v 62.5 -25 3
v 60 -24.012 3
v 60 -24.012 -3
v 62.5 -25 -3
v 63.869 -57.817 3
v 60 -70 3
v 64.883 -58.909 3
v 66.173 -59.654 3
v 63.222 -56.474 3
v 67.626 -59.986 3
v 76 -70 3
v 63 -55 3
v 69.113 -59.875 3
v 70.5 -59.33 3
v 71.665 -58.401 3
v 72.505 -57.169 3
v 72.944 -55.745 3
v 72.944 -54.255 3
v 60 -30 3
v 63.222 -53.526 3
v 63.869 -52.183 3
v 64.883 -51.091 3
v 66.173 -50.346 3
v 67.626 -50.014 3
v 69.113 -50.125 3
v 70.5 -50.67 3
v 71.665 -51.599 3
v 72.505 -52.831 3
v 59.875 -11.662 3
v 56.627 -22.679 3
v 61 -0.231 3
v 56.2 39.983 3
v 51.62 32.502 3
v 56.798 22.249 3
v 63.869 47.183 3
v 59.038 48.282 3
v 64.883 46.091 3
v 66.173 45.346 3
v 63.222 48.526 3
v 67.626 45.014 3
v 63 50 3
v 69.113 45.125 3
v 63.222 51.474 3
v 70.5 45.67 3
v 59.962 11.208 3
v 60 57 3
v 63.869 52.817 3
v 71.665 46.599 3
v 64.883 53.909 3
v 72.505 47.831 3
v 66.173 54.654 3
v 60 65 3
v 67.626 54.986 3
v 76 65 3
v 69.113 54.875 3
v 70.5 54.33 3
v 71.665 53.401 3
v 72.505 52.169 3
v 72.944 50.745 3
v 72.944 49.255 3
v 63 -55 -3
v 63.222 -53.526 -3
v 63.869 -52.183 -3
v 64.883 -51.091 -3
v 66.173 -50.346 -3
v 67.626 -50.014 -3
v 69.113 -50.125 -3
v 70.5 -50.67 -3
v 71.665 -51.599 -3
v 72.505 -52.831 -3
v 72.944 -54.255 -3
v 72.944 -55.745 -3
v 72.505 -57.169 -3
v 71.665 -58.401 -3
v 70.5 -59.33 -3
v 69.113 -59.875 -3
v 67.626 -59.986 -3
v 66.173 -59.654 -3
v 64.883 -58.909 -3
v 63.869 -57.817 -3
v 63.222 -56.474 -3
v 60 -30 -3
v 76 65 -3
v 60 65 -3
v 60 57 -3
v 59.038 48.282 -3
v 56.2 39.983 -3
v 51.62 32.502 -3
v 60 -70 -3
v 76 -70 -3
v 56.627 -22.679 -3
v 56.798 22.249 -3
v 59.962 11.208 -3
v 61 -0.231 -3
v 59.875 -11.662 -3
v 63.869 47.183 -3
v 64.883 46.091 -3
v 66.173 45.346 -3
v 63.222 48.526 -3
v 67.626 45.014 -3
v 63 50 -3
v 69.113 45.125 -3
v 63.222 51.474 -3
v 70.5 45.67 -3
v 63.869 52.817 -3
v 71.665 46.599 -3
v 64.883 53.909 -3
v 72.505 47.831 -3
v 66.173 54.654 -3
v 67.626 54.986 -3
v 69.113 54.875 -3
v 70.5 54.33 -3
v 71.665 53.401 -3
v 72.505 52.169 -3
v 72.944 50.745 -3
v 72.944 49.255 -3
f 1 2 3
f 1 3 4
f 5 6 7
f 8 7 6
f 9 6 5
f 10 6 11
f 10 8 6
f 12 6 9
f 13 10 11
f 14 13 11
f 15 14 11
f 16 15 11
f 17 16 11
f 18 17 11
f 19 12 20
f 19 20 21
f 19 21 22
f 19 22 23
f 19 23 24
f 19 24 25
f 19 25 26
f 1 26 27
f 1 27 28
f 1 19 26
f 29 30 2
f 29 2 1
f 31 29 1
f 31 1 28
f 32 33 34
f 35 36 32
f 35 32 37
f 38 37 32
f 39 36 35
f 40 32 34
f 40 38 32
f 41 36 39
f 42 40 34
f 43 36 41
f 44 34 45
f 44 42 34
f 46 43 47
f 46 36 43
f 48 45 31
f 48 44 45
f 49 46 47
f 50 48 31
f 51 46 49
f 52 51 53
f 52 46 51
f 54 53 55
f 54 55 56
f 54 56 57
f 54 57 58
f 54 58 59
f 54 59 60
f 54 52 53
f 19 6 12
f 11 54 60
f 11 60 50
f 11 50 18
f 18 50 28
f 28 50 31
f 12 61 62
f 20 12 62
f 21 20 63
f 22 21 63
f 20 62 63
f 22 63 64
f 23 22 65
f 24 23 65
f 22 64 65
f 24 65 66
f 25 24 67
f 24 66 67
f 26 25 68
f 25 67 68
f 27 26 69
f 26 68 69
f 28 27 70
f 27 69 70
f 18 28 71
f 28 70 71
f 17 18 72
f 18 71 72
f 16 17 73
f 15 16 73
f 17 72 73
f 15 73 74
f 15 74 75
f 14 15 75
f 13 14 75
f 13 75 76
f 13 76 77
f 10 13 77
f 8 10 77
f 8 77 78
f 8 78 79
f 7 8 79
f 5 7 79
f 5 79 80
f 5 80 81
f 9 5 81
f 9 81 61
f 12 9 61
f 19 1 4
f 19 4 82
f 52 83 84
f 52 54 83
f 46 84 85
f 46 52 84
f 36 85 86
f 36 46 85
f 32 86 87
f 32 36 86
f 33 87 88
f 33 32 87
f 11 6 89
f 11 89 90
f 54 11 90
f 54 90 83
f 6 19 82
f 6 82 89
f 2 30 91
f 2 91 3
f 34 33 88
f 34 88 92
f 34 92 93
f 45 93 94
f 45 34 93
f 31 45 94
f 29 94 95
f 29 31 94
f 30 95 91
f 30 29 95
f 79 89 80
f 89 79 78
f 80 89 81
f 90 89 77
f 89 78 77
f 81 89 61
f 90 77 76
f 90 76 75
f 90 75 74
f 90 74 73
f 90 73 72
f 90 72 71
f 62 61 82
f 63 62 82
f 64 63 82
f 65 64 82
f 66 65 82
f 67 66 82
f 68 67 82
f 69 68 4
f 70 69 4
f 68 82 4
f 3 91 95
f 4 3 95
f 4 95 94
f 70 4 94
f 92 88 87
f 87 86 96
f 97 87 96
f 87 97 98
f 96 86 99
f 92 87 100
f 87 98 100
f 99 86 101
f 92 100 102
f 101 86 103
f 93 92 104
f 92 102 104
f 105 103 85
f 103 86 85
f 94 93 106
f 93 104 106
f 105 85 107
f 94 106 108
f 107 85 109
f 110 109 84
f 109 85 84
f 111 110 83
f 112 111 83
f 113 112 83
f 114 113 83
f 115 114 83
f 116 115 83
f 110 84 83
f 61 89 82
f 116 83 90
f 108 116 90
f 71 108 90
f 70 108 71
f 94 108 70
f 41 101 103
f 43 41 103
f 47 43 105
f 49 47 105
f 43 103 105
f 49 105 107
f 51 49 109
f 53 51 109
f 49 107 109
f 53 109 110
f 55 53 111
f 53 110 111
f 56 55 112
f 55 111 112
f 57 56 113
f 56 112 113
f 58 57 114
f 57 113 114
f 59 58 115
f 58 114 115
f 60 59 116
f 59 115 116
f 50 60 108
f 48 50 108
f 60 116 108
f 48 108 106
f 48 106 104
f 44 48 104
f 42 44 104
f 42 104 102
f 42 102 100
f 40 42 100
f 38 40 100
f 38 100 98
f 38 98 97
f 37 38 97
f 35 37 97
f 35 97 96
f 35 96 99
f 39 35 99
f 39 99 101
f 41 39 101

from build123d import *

# Parameters (mm, degrees)
BOSS_EXTRUDE1_DEPTH        = 3
F_10_0_10_DIAMETER_HOLE1_D = 10


with BuildPart() as part:
    # Sketch1 → Boss-Extrude1 (new, symmetric)
    with BuildSketch(Plane.XY):
        with BuildLine():
            Line((59.999997079, 62), (59.999997079, 57))
            ThreePointArc((59.999997079, 57), (57.847096138, 44.054070414), (51.620142438, 32.501706028))
            ThreePointArc((51.620142438, 32.501706028), (60.750395332, 5.512664234), (56.627398554, -22.679015256))
            Line((56.627398554, -22.679015256), (60, -24.011943529))
            Line((60, -24.011943529), (62.5, -25))
            Line((62.5, -25), (60, -30))
            Line((60, -30), (60, -70))
            Line((60, -70), (75.999997079, -70))
            Line((75.999997079, -70), (75.999997079, 62))
            Line((75.999997079, 62), (75.999997079, 65))
            Line((75.999997079, 65), (59.999997079, 65))
            Line((59.999997079, 65), (59.999997079, 62))
        make_face()
    extrude(amount=BOSS_EXTRUDE1_DEPTH, both=True)

    # Ø10.0 (10) Diameter Hole1 (through all)
    with Locations(Plane(origin=(67.999997079, 50, 3), x_dir=(1, 0, 0), z_dir=(0, 0, 1))):
        with Locations((0, 0), (0, -105)):
            Hole(F_10_0_10_DIAMETER_HOLE1_D / 2)


solid = part.part
